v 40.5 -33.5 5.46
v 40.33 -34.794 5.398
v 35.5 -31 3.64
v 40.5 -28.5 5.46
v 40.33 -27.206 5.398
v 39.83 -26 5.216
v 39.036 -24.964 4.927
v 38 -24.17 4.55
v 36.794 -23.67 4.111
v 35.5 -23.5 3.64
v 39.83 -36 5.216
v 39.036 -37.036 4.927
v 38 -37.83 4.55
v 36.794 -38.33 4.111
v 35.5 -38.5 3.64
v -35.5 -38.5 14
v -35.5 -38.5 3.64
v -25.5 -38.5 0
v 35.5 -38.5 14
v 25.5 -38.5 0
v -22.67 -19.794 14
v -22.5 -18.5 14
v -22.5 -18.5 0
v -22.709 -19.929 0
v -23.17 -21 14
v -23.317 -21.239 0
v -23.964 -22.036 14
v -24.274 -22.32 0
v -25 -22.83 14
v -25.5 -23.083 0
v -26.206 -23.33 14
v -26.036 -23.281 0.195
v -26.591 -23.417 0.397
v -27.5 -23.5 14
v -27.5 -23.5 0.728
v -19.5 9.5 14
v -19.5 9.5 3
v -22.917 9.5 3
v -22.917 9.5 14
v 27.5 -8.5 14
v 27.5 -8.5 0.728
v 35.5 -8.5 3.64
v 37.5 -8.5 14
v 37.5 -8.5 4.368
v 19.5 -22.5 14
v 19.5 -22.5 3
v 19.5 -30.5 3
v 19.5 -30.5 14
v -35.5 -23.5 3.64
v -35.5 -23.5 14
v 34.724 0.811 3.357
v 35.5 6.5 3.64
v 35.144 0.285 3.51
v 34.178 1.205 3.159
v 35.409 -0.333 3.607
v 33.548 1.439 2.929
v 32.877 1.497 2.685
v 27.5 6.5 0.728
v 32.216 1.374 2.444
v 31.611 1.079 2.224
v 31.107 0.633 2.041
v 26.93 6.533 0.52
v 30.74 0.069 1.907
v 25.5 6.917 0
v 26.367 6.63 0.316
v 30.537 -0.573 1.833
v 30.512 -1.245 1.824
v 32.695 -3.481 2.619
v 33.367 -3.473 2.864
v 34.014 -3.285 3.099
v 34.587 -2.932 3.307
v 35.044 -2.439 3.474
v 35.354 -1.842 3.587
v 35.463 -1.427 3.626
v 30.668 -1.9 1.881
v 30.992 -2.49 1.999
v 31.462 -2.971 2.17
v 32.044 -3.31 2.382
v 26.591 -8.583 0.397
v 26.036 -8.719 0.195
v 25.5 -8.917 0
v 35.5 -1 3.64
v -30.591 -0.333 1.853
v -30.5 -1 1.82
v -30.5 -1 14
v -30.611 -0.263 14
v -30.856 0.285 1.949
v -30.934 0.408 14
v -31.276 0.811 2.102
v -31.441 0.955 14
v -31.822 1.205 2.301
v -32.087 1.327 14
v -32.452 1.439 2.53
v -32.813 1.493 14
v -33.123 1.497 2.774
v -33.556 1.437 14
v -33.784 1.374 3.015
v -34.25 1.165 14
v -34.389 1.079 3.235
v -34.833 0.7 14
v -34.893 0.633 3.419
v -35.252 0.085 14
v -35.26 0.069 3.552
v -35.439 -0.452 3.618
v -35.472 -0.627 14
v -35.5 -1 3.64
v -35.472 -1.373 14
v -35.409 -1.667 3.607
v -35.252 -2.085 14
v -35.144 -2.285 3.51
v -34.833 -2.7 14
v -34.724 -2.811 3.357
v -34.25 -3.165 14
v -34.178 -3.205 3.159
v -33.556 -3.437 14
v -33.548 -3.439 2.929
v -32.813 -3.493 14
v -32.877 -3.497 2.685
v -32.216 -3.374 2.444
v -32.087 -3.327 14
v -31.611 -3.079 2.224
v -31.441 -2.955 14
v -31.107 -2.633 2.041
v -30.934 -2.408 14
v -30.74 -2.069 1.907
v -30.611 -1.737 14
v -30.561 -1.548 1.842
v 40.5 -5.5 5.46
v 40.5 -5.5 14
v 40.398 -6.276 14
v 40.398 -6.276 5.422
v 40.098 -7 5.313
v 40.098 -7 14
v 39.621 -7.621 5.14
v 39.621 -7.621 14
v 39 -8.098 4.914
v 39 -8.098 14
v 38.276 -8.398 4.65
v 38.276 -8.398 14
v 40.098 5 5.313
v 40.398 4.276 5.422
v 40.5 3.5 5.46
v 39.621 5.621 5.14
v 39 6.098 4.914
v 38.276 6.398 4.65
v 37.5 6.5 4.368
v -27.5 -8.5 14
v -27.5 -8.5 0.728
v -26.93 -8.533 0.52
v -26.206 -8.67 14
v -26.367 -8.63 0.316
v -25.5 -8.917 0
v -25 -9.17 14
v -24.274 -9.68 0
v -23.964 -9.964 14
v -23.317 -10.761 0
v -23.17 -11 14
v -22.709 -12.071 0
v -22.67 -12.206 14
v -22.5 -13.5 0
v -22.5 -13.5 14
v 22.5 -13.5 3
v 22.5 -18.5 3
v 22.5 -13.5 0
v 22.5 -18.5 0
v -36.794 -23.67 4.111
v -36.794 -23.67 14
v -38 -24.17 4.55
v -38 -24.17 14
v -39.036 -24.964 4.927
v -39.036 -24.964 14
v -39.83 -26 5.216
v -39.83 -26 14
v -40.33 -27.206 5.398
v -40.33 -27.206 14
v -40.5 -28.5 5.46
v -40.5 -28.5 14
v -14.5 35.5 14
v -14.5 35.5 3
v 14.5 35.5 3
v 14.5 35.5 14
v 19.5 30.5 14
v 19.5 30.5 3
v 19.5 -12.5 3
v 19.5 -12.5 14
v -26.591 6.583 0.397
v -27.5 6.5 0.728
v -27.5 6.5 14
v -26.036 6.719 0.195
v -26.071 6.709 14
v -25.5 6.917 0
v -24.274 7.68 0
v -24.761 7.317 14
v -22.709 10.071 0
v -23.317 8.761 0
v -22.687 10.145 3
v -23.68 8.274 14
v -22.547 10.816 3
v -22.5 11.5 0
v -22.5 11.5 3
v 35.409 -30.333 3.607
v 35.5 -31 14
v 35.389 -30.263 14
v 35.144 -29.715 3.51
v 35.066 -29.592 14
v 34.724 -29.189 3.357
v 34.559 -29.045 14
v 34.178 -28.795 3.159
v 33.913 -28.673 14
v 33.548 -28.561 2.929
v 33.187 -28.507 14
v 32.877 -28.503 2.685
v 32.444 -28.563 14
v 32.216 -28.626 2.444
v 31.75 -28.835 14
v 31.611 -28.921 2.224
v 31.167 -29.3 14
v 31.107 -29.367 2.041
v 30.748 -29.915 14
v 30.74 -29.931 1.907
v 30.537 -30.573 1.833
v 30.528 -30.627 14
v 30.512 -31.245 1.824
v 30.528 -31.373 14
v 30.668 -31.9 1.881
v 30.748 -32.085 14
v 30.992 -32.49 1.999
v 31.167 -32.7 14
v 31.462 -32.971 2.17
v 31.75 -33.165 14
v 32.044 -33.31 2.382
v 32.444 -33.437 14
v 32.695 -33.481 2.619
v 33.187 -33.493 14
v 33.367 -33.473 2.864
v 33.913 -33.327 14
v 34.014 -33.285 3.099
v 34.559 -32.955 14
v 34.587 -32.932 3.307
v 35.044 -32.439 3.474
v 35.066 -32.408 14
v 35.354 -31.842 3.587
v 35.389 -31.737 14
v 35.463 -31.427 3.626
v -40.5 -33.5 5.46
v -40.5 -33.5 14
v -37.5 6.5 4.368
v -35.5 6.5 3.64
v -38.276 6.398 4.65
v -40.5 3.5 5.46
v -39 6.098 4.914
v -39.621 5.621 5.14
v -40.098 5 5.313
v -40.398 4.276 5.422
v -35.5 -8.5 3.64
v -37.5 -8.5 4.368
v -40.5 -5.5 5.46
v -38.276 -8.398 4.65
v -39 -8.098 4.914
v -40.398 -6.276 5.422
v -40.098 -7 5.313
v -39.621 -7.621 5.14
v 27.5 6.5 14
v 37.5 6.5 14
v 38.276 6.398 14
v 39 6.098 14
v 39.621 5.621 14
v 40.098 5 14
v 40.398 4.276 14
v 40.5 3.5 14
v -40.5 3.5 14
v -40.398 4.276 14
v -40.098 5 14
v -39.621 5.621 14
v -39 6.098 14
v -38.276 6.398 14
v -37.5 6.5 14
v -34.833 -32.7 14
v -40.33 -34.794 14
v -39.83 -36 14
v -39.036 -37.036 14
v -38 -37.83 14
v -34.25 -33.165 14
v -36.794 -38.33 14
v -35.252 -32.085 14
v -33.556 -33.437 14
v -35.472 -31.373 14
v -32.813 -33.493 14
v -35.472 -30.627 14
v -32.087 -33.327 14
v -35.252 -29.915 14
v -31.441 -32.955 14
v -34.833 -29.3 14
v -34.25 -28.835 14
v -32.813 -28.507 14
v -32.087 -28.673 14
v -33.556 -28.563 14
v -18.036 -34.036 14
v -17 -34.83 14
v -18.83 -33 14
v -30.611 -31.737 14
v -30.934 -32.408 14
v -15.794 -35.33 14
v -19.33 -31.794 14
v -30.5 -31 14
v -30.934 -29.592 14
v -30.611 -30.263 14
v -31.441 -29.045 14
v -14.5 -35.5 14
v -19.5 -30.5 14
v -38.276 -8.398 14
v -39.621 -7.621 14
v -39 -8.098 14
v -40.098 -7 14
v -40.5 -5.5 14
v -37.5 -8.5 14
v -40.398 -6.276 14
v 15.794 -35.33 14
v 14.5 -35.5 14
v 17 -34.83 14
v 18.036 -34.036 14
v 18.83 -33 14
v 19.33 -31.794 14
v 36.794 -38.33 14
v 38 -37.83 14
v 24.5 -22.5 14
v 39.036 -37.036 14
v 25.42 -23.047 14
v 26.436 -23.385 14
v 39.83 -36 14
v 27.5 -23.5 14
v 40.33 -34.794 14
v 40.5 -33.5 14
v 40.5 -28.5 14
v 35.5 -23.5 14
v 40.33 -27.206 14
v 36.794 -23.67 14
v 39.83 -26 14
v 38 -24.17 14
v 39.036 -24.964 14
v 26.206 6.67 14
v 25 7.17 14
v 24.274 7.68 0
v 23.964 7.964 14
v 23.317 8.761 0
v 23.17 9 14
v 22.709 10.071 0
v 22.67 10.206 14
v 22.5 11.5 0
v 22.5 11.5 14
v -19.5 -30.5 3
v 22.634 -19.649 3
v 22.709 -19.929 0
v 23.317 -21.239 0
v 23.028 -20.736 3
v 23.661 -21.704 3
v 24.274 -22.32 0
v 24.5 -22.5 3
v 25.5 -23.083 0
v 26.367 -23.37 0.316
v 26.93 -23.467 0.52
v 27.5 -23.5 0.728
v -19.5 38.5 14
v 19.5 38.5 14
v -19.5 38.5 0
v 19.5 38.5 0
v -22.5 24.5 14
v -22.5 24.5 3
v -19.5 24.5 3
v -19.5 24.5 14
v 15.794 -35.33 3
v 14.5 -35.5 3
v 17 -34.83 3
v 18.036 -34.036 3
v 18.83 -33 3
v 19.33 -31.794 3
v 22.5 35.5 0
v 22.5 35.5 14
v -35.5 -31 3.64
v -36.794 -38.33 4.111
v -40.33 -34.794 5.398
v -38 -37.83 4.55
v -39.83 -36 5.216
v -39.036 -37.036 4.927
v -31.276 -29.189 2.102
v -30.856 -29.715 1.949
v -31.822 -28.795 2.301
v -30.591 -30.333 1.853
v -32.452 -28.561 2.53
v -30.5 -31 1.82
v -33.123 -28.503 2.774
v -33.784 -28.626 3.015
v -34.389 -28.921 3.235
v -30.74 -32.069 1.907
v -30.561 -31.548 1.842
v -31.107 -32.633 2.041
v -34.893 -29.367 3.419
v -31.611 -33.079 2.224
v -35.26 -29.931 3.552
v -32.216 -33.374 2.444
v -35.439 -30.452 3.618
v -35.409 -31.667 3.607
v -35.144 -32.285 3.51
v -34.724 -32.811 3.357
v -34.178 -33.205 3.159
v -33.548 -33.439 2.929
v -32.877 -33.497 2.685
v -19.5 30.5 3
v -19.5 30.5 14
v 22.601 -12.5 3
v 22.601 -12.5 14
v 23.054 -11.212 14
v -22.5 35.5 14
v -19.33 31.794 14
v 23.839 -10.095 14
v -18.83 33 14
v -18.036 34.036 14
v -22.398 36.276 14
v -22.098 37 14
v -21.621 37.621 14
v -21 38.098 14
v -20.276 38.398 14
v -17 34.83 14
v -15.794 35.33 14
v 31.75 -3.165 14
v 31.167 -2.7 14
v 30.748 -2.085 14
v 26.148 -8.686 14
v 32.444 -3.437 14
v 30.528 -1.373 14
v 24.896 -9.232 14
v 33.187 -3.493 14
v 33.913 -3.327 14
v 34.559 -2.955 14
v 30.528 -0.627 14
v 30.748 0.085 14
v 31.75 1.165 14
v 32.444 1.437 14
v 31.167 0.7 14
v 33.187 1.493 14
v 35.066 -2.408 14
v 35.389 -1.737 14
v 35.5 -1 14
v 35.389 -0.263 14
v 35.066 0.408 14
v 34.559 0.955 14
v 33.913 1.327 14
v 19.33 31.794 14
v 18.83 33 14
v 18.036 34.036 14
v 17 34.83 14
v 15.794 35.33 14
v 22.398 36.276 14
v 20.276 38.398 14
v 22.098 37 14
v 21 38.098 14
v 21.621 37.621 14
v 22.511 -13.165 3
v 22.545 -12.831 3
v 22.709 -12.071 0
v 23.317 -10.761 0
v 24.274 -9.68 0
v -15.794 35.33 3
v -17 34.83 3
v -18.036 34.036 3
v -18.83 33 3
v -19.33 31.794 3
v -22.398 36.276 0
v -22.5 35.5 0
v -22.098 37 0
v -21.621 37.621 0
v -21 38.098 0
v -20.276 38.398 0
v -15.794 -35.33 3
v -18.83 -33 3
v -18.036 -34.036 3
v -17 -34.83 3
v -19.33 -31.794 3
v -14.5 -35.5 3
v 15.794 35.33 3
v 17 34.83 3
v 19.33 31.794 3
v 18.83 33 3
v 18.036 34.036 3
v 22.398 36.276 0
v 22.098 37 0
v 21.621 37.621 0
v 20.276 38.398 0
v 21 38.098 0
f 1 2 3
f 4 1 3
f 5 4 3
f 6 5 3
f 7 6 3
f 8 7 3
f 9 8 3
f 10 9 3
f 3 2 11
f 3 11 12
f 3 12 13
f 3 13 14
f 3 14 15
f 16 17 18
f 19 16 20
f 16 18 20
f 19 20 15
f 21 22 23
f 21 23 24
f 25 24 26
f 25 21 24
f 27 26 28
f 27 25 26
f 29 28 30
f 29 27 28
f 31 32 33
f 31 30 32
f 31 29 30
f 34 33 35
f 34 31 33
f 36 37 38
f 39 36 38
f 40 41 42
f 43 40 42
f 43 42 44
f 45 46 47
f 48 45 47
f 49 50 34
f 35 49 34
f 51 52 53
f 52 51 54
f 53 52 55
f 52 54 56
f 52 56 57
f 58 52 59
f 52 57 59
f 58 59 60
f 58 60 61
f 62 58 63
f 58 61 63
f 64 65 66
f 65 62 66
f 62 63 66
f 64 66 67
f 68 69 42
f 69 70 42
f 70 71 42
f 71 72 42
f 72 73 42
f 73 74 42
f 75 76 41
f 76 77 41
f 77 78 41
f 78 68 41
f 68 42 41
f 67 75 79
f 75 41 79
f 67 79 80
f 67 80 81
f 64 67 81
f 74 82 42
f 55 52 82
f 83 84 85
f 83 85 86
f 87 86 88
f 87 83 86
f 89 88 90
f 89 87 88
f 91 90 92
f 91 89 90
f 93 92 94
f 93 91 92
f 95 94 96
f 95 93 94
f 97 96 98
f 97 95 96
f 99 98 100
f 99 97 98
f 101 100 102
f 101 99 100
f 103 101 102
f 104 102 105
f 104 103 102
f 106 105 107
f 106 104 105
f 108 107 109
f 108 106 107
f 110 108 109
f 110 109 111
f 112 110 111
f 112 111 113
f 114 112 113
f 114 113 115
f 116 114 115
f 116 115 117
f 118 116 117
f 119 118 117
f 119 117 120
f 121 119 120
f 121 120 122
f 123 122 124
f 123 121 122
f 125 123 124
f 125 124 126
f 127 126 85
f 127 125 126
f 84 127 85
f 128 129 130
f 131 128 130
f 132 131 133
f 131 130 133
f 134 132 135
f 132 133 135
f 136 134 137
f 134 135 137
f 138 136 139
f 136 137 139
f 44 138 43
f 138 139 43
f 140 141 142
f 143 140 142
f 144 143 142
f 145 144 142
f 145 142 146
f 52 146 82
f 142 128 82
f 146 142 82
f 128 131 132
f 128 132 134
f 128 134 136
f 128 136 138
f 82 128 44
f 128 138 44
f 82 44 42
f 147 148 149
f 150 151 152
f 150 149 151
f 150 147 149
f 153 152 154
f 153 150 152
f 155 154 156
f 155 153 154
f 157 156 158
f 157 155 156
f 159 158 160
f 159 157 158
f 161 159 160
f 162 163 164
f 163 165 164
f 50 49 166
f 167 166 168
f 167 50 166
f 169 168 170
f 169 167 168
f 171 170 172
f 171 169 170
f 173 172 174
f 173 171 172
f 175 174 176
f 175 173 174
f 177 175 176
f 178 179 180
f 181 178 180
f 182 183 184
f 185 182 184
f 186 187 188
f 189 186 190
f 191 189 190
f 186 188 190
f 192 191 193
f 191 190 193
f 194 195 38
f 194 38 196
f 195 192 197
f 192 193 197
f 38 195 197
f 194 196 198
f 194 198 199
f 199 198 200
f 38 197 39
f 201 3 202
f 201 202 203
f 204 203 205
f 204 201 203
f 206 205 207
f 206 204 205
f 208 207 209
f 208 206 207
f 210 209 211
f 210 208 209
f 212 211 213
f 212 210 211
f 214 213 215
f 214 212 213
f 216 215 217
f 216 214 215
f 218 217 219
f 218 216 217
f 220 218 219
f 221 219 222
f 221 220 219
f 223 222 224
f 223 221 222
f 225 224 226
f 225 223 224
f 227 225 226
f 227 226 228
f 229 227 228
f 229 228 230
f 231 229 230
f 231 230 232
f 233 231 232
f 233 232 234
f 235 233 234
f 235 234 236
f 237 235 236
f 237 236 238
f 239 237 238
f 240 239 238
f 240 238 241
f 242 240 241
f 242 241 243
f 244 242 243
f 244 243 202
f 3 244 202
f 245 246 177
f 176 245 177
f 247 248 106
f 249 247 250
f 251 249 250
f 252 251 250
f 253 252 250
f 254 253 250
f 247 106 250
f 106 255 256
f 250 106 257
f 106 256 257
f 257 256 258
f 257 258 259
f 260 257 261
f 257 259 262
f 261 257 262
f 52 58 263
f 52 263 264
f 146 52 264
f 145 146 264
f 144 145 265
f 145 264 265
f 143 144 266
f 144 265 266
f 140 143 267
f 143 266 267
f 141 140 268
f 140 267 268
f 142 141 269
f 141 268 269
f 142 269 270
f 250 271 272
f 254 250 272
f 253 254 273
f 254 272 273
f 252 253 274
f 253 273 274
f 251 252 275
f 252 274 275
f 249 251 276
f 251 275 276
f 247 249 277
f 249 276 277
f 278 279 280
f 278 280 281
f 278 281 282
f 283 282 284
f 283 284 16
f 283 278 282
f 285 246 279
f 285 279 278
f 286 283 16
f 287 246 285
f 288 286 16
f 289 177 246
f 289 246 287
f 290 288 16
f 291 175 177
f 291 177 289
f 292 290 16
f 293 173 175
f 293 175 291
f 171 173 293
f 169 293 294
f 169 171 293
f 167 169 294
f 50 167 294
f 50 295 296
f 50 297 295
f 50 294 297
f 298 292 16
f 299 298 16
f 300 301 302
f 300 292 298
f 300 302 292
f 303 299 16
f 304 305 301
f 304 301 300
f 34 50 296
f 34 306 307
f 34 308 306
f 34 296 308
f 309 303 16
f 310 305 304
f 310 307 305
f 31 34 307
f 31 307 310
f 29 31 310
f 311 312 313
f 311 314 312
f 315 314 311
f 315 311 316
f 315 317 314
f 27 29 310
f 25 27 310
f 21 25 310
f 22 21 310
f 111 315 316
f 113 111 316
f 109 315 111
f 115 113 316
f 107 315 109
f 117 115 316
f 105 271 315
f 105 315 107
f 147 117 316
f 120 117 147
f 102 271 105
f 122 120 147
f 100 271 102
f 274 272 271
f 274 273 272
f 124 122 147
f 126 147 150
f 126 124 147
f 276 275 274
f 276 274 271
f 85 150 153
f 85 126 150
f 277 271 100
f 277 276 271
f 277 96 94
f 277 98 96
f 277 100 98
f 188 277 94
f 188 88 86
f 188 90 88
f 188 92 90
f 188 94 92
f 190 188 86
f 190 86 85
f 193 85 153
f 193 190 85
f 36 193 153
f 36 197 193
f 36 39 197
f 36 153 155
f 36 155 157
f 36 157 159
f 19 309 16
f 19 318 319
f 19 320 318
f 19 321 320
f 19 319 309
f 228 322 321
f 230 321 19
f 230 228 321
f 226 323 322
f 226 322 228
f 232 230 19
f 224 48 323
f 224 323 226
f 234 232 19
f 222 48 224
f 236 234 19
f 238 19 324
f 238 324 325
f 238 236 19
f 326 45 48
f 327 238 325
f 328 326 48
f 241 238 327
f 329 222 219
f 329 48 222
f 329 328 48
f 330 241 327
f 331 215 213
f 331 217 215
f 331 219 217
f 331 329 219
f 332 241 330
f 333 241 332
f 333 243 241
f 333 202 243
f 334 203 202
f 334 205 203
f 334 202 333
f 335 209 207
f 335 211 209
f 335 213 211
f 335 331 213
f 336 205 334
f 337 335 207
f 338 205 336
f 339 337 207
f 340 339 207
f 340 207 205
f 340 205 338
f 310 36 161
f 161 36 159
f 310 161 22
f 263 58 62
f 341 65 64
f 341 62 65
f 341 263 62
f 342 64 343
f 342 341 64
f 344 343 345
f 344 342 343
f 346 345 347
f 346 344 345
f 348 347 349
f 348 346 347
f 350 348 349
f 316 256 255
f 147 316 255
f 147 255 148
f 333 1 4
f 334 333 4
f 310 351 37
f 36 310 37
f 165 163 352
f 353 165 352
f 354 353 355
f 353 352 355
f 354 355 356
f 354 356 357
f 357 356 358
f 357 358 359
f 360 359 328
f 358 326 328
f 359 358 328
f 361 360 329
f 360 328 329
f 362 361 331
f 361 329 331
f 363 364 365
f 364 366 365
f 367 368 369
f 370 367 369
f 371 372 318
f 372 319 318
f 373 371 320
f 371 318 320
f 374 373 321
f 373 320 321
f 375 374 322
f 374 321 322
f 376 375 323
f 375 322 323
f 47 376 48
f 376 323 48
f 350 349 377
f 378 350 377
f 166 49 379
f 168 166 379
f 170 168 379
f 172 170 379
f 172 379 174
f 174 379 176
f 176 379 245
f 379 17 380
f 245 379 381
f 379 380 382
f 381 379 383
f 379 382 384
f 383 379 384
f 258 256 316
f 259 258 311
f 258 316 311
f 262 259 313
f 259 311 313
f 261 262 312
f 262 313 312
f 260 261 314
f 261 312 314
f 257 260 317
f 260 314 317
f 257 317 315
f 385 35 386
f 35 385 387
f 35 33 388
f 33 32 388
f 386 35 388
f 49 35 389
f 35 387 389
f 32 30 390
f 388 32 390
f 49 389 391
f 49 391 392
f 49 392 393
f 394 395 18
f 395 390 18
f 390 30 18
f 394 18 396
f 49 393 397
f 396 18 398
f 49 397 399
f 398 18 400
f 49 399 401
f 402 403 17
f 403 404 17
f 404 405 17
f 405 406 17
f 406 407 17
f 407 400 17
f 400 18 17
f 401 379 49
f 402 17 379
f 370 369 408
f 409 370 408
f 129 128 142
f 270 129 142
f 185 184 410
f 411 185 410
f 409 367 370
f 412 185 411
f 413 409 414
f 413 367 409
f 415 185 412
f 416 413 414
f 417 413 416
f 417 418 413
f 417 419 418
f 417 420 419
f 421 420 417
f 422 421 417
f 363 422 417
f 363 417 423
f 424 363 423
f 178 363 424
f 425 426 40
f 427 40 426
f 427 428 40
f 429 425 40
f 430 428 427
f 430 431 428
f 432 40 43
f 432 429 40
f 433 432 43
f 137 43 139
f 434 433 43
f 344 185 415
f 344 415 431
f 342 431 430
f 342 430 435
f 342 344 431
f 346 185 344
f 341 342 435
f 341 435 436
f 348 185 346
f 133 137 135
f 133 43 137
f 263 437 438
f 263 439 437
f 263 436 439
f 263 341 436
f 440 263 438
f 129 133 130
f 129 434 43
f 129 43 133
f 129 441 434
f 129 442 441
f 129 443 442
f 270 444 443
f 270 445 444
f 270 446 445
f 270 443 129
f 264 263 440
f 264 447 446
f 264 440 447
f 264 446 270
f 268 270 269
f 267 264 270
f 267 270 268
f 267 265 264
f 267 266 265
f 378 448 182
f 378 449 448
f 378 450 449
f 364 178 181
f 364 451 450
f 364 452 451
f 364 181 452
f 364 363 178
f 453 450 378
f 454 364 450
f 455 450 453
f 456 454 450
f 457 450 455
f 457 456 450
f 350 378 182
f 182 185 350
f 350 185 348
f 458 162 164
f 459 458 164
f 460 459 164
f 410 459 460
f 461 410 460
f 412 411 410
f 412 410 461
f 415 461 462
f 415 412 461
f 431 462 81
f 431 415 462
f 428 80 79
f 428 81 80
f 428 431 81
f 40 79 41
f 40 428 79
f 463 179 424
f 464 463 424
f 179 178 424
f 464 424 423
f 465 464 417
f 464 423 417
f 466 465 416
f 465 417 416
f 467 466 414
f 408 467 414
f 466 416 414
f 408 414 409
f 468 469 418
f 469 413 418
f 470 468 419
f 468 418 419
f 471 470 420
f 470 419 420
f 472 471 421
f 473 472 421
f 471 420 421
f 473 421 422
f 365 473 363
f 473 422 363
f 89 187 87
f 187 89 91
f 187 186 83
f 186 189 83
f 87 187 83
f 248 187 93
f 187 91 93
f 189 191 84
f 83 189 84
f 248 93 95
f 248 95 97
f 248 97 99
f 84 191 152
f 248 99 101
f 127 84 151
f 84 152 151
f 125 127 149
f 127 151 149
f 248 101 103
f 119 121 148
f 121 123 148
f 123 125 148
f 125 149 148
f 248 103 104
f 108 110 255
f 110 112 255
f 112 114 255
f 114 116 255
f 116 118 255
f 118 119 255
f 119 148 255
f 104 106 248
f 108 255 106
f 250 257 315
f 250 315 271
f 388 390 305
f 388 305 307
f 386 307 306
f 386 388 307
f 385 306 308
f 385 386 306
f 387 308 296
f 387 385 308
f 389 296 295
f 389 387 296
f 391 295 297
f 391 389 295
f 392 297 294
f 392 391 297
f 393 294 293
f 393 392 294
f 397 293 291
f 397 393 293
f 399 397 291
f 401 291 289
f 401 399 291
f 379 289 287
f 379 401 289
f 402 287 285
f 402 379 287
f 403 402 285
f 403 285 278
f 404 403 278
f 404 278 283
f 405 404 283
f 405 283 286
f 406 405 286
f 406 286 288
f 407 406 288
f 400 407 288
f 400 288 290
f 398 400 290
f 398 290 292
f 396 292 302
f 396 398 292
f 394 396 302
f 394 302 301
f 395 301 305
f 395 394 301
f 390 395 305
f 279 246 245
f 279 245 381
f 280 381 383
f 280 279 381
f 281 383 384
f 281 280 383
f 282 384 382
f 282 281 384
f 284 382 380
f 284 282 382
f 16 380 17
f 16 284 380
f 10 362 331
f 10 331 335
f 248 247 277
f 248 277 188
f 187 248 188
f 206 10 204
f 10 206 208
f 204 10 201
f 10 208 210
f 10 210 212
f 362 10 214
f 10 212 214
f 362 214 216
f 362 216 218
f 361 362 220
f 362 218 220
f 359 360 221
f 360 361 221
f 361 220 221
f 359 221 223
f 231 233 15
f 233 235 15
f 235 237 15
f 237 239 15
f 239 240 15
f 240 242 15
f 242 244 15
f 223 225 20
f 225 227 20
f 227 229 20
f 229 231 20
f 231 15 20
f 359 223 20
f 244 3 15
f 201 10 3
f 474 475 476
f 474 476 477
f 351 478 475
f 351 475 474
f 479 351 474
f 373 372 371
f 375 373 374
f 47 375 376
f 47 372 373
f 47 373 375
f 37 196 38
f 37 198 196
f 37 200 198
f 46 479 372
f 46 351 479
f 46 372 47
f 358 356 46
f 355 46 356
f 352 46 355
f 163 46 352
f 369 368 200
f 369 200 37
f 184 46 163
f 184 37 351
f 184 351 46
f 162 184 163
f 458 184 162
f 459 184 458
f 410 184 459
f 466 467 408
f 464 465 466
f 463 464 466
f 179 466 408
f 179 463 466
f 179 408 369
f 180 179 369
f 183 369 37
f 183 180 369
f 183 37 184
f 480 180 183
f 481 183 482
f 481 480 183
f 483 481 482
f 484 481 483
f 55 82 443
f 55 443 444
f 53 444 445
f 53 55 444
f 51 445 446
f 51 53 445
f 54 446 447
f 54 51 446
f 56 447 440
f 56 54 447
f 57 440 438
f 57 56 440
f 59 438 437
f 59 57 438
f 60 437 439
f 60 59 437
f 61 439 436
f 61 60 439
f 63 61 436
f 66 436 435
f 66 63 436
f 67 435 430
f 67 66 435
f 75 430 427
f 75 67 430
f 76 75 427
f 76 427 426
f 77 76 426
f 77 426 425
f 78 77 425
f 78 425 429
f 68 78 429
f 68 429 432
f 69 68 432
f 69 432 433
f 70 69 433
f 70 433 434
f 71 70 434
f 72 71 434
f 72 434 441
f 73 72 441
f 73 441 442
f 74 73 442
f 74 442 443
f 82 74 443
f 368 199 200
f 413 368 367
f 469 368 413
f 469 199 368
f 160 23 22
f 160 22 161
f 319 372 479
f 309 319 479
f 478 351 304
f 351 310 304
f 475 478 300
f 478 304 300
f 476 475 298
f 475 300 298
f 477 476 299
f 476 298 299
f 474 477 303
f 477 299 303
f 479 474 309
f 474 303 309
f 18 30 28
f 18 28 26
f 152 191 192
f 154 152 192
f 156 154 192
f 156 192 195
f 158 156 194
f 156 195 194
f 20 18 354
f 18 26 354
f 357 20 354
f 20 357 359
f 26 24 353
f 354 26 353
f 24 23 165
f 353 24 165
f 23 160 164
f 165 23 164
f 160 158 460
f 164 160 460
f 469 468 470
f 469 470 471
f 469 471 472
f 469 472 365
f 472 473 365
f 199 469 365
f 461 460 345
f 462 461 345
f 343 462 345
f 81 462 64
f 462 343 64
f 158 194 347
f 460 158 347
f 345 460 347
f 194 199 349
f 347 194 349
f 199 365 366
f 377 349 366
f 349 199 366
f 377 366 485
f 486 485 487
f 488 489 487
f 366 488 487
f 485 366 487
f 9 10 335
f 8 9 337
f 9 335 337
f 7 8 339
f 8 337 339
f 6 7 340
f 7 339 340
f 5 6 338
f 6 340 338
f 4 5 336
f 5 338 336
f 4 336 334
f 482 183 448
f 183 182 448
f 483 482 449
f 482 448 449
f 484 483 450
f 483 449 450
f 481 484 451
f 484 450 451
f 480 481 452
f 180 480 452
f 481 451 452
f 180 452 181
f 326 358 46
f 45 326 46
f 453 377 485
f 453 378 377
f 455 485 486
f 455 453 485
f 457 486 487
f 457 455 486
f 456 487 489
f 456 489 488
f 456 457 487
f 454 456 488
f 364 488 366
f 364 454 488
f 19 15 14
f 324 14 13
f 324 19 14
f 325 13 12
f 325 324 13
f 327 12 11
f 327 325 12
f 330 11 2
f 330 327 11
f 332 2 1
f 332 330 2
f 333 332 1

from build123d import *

# Parameters (mm, degrees)
F0_W      = 45
F0_H      = 77
F1_DEPTH  = 3
F4_DEPTH  = 11
F5_W      = 18
F5_H      = 15
F5_R      = 2.5
F6_DEPTH  = 14
F7_R      = 3
F8_R      = 5
F9_R      = 5
F11_DEPTH = 77.001


# Not quite as in the source:
# - a feature names something its author has since deleted; it is built from what else it names


with BuildPart() as f1:
    # F0 (on Top) → F1 (new body)
    with BuildSketch(Plane.XY):
        Rectangle(F0_W, F0_H)
    extrude(amount=F1_DEPTH)

    # F3 (on face) → F4 (join)
    with BuildSketch(Plane.XY.offset(3)):
        Polygon((19.5, -12.5), (22.5, -12.5), (22.5, 38.5), (-22.5, 38.5), (-22.5, 24.5), (-19.5, 24.5), (-19.5, 35.5), (19.5, 35.5), align=None)
        Polygon((22.5, -38.5), (22.5, -22.5), (19.5, -22.5), (19.5, -22.7520468089), (19.5, -35.5), (-19.5, -35.5), (-19.5, 9.5), (-22.5, 9.5), (-22.5, -38.5), align=None)
    extrude(amount=F4_DEPTH)

    # F5 (on Top) → F6 (join, through all)
    with BuildSketch(Plane.XY):
        with Locations((31.5, -1)):
            Rectangle(F5_W, F5_H)
        with Locations((33, -1)):
            Circle(F5_R, mode=Mode.SUBTRACT)
        with Locations((-31.5, -31)):
            Rectangle(F5_W, F5_H)
        with Locations((-33, -31)):
            Circle(F5_R, mode=Mode.SUBTRACT)
        with Locations((-31.5, -1)):
            Rectangle(F5_W, F5_H)
        with Locations((-33, -1)):
            Circle(F5_R, mode=Mode.SUBTRACT)
        with Locations((31.5, -31)):
            Rectangle(F5_W, F5_H)
        with Locations((33, -31)):
            Circle(F5_R, mode=Mode.SUBTRACT)
    extrude(amount=F6_DEPTH)

    # F7
    f7_edges = [f1.edges().sort_by_distance(p)[0] for p in [
        (-22.5, 38.5, 7),
        (22.5, 38.5, 7),
        (40.5, 6.5, 7),
        (40.5, -8.5, 7),
        (-40.5, 6.5, 7),
        (-40.5, -8.5, 7),
    ]]
    fillet(f7_edges, radius=F7_R)

    # F8
    f8_edges = [f1.edges().sort_by_distance(p)[0] for p in [
        (19.5, -35.5, 8.5),
        (-19.5, -35.5, 8.5),
        (19.5, 35.5, 8.5),
        (-19.5, 35.5, 8.5),
        (22.5, 6.5, 7),
        (22.5, -8.5, 7),
        (-22.5, -8.5, 7),
        (-22.5, 6.5, 7),
    ]]
    fillet(f8_edges, radius=F8_R)

    # F9
    f9_edges = [f1.edges().sort_by_distance(p)[0] for p in [
        (-40.5, -23.5, 7),
        (-22.5, -23.5, 7),
        (-40.5, -38.5, 7),
        (40.5, -38.5, 7),
        (40.5, -23.5, 7),
        (22.5, -23.5, 7),
    ]]
    fillet(f9_edges, radius=F9_R)

    # F10 (on face) → F11 (cut, through all)
    with BuildSketch(Plane.XZ.offset(38.5)):
        Polygon((-35.5, 0), (-25.5, 0), (-35.5, 3.6397023427), align=None)
        Polygon((-35.5, 0), (-35.5, 3.6397023427), (-49.4253699631, 8.7081225104), (-49.4253699631, 0), align=None)
        Polygon((35.5, 3.6397023427), (25.5, 0), (35.5, 0), align=None)
        Polygon((46.6463356366, 7.6966367355), (35.5, 3.6397023427), (35.5, 0), (46.6463356366, 0), align=None)
    extrude(amount=-F11_DEPTH, mode=Mode.SUBTRACT)


solid = f1.part
